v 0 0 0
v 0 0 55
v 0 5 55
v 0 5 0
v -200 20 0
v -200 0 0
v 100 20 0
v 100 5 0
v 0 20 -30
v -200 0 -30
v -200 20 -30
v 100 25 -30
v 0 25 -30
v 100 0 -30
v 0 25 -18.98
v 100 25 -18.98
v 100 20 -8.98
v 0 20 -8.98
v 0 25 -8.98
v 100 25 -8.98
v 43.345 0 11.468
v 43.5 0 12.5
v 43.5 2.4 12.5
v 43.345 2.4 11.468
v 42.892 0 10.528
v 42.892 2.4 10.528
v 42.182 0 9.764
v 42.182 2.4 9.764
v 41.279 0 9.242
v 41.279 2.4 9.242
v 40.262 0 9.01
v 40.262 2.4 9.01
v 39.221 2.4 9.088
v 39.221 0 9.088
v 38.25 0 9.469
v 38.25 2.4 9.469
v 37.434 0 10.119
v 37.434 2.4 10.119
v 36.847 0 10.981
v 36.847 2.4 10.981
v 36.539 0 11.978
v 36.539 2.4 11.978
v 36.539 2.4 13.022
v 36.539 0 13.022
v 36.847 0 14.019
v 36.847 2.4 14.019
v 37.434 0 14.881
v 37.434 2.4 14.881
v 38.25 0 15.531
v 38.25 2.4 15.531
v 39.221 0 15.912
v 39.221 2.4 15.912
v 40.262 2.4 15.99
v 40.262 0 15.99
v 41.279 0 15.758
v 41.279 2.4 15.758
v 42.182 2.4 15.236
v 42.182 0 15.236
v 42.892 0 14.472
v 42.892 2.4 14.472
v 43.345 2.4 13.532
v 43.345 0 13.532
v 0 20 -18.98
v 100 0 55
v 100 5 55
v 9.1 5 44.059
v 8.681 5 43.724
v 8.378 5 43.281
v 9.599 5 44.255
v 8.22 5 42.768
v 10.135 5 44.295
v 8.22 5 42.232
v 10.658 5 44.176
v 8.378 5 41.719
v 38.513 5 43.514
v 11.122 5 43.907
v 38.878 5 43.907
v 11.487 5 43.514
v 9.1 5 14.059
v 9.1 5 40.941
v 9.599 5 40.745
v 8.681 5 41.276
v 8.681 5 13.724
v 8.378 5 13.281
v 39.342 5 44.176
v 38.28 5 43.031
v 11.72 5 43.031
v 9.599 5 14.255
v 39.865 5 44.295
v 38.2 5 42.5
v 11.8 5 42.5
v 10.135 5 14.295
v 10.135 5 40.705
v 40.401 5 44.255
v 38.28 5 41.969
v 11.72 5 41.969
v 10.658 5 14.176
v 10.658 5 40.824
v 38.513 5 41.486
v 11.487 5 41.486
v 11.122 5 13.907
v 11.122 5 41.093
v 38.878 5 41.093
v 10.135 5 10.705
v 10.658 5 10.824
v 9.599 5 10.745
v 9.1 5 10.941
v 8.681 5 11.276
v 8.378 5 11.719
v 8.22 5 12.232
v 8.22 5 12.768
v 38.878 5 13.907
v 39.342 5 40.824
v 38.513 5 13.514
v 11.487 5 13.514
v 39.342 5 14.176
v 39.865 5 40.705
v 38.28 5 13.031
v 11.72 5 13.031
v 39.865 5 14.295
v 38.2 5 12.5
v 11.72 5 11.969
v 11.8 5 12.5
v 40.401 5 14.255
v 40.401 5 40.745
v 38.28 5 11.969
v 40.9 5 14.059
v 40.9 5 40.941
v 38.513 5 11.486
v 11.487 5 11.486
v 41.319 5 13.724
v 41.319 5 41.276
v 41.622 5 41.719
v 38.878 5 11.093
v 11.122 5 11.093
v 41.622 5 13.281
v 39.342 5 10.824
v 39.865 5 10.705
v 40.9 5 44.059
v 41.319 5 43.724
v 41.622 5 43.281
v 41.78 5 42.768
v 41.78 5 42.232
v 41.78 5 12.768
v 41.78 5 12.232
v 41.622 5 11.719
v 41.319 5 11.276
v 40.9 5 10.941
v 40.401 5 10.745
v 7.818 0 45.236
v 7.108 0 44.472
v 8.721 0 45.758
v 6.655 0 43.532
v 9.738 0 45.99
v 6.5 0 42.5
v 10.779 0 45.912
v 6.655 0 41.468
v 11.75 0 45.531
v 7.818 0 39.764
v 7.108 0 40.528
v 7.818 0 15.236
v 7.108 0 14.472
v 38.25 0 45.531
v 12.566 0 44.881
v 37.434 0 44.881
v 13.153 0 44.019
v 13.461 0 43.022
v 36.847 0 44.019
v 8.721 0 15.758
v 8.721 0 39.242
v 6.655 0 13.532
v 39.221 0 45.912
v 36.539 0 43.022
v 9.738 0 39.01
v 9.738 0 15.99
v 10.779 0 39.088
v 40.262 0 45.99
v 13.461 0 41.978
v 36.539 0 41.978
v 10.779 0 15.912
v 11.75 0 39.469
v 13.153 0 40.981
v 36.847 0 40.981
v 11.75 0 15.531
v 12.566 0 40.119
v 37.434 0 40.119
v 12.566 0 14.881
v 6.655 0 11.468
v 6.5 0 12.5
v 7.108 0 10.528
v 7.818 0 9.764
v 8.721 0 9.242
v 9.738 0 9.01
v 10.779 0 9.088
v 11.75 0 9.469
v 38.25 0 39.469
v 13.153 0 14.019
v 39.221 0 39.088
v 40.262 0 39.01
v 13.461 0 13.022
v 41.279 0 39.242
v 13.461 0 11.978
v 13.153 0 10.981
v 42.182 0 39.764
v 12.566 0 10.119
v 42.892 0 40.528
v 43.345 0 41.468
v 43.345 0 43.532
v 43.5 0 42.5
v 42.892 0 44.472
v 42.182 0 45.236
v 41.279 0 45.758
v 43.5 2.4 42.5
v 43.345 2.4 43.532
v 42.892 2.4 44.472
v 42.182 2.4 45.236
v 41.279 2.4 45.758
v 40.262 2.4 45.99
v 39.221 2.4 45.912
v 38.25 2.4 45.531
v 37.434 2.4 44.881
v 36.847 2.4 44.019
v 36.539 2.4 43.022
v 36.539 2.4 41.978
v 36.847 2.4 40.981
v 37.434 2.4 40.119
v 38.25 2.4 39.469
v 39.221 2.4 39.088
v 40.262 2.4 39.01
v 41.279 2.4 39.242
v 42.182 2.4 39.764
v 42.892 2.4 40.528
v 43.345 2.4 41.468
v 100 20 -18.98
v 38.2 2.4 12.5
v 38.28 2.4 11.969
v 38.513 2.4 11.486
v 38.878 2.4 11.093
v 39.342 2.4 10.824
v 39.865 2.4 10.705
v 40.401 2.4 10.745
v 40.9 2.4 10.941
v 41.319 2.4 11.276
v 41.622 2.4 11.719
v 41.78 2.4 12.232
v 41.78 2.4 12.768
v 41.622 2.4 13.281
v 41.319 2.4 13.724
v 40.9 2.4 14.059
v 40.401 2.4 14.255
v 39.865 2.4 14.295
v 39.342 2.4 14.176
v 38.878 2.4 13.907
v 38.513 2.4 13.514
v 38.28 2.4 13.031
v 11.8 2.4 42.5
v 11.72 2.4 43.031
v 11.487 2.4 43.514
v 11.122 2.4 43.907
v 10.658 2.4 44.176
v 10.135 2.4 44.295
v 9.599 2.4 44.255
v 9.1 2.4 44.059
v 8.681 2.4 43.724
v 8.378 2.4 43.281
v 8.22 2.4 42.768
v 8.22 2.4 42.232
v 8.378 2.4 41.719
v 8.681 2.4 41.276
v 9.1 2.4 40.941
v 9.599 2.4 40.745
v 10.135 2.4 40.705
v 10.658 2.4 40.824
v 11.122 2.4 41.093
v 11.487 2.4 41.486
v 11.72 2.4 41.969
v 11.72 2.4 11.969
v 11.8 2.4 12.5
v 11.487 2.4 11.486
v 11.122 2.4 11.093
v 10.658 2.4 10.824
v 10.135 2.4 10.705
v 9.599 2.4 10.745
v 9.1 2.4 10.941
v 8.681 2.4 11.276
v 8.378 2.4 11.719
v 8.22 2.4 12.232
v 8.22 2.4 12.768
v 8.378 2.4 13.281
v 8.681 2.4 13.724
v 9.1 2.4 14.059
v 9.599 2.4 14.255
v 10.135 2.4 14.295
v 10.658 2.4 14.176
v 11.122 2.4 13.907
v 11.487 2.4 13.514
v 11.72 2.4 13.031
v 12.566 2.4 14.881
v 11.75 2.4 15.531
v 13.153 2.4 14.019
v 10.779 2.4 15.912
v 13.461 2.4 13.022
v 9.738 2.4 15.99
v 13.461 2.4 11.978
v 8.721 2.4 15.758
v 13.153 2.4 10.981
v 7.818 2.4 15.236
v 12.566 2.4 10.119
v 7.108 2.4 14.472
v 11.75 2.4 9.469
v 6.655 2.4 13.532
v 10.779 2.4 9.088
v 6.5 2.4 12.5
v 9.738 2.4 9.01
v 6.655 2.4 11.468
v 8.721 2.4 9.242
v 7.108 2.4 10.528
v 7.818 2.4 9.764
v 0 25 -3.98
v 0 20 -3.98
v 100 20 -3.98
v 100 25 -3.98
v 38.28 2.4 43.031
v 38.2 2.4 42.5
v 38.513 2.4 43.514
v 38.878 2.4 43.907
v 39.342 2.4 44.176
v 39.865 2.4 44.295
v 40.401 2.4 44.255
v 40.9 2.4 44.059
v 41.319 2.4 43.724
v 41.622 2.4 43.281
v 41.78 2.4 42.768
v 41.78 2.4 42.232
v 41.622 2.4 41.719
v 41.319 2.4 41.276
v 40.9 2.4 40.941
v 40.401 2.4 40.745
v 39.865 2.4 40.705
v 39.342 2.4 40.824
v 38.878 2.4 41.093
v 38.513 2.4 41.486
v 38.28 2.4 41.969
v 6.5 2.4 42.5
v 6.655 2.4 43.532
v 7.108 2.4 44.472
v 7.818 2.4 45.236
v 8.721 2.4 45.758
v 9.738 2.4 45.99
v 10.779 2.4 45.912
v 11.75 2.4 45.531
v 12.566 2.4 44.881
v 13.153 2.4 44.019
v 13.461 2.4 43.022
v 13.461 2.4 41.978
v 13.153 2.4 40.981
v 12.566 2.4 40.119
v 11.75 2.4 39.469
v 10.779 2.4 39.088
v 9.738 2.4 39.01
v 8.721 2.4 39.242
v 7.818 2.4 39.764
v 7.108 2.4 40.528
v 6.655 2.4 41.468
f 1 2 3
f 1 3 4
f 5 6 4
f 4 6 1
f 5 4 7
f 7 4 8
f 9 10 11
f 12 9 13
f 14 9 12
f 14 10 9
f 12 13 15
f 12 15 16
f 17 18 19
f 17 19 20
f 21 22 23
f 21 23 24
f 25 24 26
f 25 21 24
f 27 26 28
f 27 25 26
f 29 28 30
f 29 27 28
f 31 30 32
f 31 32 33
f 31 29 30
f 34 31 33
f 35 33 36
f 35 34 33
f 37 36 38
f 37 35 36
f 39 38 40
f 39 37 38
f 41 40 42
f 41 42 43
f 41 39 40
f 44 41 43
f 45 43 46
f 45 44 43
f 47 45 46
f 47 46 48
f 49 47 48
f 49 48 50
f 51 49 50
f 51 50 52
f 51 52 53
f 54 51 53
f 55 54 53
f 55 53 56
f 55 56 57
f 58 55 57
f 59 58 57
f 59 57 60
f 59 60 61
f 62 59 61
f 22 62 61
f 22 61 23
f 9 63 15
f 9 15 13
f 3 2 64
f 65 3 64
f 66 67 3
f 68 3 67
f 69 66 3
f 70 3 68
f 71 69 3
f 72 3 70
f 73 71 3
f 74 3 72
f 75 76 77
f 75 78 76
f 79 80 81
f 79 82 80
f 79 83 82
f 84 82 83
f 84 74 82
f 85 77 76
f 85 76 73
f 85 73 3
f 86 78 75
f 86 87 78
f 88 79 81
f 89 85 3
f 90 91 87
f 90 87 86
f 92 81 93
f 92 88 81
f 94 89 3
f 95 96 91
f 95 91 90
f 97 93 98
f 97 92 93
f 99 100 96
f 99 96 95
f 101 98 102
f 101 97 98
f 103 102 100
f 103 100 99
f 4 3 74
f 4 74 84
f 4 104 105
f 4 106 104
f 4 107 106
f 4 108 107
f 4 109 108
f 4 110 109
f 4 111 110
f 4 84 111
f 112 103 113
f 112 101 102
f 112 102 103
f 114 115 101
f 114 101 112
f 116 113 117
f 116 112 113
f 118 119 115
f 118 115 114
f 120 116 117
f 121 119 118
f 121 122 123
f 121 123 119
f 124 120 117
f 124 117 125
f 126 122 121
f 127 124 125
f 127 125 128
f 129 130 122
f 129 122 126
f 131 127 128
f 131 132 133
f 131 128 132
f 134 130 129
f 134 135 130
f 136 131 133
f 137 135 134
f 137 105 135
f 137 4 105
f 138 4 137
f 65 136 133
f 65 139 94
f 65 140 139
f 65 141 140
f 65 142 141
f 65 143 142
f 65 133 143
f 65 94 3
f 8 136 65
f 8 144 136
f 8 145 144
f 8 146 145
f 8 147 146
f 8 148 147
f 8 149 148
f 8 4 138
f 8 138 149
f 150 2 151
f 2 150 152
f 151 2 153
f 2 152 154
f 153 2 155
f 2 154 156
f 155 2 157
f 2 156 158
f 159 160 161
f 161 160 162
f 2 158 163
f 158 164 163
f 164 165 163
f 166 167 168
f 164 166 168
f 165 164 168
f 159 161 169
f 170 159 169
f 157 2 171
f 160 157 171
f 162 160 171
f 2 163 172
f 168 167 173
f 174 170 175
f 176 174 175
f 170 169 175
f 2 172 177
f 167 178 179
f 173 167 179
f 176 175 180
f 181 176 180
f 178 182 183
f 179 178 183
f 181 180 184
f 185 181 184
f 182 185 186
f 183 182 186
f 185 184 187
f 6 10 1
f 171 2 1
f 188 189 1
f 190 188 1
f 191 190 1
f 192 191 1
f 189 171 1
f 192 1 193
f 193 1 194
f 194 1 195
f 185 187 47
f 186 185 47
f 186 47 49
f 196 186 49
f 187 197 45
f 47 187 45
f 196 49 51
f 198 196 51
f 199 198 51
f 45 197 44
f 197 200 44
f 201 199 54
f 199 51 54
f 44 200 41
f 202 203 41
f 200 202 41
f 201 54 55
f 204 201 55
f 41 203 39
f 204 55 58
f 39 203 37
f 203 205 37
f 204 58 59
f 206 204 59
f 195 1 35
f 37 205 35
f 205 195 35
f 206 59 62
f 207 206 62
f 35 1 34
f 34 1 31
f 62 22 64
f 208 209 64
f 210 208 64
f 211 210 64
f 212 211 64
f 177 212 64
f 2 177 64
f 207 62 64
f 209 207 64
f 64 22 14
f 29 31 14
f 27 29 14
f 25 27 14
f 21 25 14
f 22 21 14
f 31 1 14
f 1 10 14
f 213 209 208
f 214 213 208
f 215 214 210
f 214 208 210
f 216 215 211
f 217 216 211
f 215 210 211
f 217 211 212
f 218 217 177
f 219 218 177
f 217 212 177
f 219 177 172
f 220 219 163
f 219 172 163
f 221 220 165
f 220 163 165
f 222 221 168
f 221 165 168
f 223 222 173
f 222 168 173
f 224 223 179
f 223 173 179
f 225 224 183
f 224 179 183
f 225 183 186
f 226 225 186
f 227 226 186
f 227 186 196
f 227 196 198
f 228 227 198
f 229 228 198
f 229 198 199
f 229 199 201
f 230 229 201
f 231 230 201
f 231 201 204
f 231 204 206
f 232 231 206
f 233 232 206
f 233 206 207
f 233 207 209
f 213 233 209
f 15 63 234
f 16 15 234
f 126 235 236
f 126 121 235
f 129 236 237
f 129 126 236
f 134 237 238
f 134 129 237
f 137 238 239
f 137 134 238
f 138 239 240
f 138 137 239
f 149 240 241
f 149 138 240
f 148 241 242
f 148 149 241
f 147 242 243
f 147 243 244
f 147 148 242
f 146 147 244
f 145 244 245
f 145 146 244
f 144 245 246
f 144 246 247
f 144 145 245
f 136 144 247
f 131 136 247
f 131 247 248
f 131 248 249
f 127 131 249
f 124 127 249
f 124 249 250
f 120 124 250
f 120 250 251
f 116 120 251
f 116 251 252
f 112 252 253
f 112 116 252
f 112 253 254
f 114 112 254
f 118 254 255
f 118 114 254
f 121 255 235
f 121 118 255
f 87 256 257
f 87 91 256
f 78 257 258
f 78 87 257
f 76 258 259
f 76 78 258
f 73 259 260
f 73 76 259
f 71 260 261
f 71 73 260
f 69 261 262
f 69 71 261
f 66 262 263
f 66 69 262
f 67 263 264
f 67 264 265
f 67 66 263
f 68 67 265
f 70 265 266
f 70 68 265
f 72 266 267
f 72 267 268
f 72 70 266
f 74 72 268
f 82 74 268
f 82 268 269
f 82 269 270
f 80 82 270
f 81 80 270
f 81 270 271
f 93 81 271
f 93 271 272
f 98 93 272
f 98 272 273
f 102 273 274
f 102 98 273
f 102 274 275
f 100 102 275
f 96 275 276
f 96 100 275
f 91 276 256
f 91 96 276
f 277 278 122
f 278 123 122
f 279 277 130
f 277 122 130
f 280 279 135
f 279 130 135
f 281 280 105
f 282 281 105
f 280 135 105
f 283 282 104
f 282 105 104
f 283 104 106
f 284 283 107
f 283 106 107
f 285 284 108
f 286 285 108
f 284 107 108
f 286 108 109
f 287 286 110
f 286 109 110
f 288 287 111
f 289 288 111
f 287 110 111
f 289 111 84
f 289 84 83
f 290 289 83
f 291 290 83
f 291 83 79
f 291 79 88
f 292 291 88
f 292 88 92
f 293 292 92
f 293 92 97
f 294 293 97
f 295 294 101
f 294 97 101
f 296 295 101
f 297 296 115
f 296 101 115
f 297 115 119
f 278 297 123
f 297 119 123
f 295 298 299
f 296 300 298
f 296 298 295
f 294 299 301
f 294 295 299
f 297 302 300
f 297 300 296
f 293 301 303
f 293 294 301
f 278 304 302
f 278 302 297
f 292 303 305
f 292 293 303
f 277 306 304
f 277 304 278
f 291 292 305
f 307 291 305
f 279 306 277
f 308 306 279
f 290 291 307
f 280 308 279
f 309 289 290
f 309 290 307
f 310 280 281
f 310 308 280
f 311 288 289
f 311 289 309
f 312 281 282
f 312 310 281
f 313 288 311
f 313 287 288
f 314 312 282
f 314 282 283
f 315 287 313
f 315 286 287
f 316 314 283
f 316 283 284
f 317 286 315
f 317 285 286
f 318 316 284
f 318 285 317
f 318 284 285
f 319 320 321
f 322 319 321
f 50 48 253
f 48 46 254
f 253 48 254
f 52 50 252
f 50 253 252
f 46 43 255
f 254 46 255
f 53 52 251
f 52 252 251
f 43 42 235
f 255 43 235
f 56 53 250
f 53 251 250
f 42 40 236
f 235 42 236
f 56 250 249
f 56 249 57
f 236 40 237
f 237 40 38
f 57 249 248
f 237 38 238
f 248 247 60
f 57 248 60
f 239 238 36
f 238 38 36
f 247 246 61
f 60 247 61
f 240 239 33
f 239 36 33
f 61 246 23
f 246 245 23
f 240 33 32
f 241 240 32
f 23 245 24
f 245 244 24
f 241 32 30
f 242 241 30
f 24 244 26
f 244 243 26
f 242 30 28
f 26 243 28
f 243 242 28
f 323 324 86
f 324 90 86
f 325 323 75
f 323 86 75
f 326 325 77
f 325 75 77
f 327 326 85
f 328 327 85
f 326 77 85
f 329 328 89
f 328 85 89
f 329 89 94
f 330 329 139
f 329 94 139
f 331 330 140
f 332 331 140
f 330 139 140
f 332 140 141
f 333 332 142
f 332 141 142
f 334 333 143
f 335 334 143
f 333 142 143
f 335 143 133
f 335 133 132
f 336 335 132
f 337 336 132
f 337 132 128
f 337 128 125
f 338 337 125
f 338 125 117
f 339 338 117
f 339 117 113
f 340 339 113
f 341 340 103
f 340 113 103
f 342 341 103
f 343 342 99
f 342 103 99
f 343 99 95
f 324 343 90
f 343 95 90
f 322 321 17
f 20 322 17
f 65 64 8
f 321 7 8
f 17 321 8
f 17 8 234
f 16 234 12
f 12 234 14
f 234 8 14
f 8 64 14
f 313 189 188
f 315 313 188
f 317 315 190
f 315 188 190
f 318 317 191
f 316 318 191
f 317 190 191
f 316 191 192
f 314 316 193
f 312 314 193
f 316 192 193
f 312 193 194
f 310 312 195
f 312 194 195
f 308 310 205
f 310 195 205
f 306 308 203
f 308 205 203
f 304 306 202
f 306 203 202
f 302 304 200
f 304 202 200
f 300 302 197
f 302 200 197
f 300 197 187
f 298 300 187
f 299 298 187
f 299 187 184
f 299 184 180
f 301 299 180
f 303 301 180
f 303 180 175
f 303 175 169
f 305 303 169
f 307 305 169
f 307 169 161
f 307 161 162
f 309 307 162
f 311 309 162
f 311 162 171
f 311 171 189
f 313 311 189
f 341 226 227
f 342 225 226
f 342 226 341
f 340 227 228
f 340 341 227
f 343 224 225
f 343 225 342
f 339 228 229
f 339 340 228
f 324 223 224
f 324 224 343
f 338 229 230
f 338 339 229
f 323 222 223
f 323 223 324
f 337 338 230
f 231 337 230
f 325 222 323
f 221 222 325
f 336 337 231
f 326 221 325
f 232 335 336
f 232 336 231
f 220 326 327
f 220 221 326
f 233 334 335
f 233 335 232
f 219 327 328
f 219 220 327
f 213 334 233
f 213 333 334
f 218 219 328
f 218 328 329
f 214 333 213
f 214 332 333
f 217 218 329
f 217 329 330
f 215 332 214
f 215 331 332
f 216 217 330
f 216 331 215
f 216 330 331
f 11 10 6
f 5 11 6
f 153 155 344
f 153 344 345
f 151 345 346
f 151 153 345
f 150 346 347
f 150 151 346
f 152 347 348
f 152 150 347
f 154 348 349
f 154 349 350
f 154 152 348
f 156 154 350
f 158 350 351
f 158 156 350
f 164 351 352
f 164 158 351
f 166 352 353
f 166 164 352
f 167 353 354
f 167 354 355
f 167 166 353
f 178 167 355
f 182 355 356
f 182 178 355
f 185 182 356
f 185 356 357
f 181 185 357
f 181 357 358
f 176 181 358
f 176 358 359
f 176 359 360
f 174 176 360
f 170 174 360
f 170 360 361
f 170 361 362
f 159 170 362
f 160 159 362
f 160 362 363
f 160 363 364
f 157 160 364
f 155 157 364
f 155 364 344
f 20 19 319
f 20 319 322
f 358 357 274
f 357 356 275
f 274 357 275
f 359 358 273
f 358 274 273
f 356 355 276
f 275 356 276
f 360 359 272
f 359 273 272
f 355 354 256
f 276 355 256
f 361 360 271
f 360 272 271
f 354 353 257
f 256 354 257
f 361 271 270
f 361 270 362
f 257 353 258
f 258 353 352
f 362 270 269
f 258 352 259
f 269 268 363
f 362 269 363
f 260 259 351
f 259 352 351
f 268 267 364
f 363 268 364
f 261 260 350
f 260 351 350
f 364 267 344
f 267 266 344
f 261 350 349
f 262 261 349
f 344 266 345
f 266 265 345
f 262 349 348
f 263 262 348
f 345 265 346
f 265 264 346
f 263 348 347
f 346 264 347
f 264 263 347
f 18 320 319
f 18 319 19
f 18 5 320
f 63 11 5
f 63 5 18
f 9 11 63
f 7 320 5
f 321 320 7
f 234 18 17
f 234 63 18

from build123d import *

# Parameters (mm, degrees)
SKETCH1_W                                        = 100
SKETCH1_H                                        = 55
BOSS_EXTRUDE1_DEPTH                              = 5
CBORE_FOR_M3_PAN_HEAD_MACHINE_SCREW1_D           = 3.6
CBORE_FOR_M3_PAN_HEAD_MACHINE_SCREW1_CBORE_D     = 7
CBORE_FOR_M3_PAN_HEAD_MACHINE_SCREW1_CBORE_DEPTH = 2.4
MIRROR1_AT_THE_SECOND_PLANE_COPY_1_D             = 3.6
MIRROR1_AT_THE_SECOND_PLANE_COPY_1_CBORE_D       = 7
MIRROR1_AT_THE_SECOND_PLANE_COPY_1_CBORE_DEPTH   = 2.4
BOSS_EXTRUDE3_DEPTH                              = 15
BOSS_EXTRUDE3_DEPTH_BACK                         = 5
SKETCH11_W                                       = 100
SKETCH11_H                                       = 11.02
SKETCH11_H_2                                     = 5
BOSS_EXTRUDE5_DEPTH                              = 5


with BuildPart() as part:
    # Sketch1 → Boss-Extrude1 (new body)
    with BuildSketch(Plane(origin=(0, 0, 0), x_dir=(1, 0, 0), z_dir=(0, 1, 0))):
        with Locations((50, -27.5)):
            Rectangle(SKETCH1_W, SKETCH1_H)
    extrude(amount=BOSS_EXTRUDE1_DEPTH)

    # CBORE for M3 Pan Head Machine Screw1 (through all)
    with Locations(Plane(origin=(0, 0, 0), x_dir=(-1, 0, 0), z_dir=(0, -1, 0))):
        with Locations((-10, -12.5)):
            cbore_for_m3_pan_head_machine_screw1 = CounterBoreHole(CBORE_FOR_M3_PAN_HEAD_MACHINE_SCREW1_D / 2, CBORE_FOR_M3_PAN_HEAD_MACHINE_SCREW1_CBORE_D / 2, CBORE_FOR_M3_PAN_HEAD_MACHINE_SCREW1_CBORE_DEPTH)

    # Mirror1: CBORE for M3 Pan Head Machine Screw1 across plane
    add(cbore_for_m3_pan_head_machine_screw1.mirror(Plane.XY.offset(27.5)), mode=Mode.SUBTRACT)

    # Mirror1 at the second plane: CBORE for M3 Pan Head Machine Screw1 across plane
    add(cbore_for_m3_pan_head_machine_screw1.mirror(Plane.ZY.offset(-25)), mode=Mode.SUBTRACT)

    # Mirror1 at the second plane copy 1 (through all)
    with Locations(Plane(origin=(50, 0, 55), x_dir=(1, 0, 0), z_dir=(0, -1, 0))):
        with Locations((-10, -12.5)):
            CounterBoreHole(MIRROR1_AT_THE_SECOND_PLANE_COPY_1_D / 2, MIRROR1_AT_THE_SECOND_PLANE_COPY_1_CBORE_D / 2, MIRROR1_AT_THE_SECOND_PLANE_COPY_1_CBORE_DEPTH)

    # Sketch9 → Boss-Extrude3 (add, two sides: drawn at the far end of the back side and taken through both)
    with BuildSketch(Plane(origin=(0, 5, 0), x_dir=(1, 0, 0), z_dir=(0, 1, 0)).offset(-BOSS_EXTRUDE3_DEPTH_BACK)):
        Polygon((-200, 0), (50, 0), (100, 0), (100, 30), (-200, 30), align=None)
    extrude(amount=BOSS_EXTRUDE3_DEPTH + BOSS_EXTRUDE3_DEPTH_BACK)

    # Sketch11 → Boss-Extrude5 (add)
    with BuildSketch(Plane(origin=(0, 20, 0), x_dir=(1, 0, 0), z_dir=(0, 1, 0))):
        with Locations((50, 24.49)):
            Rectangle(SKETCH11_W, SKETCH11_H)
        with Locations((50, 6.48)):
            Rectangle(SKETCH11_W, SKETCH11_H_2)
    extrude(amount=BOSS_EXTRUDE5_DEPTH)


solid = part.part
